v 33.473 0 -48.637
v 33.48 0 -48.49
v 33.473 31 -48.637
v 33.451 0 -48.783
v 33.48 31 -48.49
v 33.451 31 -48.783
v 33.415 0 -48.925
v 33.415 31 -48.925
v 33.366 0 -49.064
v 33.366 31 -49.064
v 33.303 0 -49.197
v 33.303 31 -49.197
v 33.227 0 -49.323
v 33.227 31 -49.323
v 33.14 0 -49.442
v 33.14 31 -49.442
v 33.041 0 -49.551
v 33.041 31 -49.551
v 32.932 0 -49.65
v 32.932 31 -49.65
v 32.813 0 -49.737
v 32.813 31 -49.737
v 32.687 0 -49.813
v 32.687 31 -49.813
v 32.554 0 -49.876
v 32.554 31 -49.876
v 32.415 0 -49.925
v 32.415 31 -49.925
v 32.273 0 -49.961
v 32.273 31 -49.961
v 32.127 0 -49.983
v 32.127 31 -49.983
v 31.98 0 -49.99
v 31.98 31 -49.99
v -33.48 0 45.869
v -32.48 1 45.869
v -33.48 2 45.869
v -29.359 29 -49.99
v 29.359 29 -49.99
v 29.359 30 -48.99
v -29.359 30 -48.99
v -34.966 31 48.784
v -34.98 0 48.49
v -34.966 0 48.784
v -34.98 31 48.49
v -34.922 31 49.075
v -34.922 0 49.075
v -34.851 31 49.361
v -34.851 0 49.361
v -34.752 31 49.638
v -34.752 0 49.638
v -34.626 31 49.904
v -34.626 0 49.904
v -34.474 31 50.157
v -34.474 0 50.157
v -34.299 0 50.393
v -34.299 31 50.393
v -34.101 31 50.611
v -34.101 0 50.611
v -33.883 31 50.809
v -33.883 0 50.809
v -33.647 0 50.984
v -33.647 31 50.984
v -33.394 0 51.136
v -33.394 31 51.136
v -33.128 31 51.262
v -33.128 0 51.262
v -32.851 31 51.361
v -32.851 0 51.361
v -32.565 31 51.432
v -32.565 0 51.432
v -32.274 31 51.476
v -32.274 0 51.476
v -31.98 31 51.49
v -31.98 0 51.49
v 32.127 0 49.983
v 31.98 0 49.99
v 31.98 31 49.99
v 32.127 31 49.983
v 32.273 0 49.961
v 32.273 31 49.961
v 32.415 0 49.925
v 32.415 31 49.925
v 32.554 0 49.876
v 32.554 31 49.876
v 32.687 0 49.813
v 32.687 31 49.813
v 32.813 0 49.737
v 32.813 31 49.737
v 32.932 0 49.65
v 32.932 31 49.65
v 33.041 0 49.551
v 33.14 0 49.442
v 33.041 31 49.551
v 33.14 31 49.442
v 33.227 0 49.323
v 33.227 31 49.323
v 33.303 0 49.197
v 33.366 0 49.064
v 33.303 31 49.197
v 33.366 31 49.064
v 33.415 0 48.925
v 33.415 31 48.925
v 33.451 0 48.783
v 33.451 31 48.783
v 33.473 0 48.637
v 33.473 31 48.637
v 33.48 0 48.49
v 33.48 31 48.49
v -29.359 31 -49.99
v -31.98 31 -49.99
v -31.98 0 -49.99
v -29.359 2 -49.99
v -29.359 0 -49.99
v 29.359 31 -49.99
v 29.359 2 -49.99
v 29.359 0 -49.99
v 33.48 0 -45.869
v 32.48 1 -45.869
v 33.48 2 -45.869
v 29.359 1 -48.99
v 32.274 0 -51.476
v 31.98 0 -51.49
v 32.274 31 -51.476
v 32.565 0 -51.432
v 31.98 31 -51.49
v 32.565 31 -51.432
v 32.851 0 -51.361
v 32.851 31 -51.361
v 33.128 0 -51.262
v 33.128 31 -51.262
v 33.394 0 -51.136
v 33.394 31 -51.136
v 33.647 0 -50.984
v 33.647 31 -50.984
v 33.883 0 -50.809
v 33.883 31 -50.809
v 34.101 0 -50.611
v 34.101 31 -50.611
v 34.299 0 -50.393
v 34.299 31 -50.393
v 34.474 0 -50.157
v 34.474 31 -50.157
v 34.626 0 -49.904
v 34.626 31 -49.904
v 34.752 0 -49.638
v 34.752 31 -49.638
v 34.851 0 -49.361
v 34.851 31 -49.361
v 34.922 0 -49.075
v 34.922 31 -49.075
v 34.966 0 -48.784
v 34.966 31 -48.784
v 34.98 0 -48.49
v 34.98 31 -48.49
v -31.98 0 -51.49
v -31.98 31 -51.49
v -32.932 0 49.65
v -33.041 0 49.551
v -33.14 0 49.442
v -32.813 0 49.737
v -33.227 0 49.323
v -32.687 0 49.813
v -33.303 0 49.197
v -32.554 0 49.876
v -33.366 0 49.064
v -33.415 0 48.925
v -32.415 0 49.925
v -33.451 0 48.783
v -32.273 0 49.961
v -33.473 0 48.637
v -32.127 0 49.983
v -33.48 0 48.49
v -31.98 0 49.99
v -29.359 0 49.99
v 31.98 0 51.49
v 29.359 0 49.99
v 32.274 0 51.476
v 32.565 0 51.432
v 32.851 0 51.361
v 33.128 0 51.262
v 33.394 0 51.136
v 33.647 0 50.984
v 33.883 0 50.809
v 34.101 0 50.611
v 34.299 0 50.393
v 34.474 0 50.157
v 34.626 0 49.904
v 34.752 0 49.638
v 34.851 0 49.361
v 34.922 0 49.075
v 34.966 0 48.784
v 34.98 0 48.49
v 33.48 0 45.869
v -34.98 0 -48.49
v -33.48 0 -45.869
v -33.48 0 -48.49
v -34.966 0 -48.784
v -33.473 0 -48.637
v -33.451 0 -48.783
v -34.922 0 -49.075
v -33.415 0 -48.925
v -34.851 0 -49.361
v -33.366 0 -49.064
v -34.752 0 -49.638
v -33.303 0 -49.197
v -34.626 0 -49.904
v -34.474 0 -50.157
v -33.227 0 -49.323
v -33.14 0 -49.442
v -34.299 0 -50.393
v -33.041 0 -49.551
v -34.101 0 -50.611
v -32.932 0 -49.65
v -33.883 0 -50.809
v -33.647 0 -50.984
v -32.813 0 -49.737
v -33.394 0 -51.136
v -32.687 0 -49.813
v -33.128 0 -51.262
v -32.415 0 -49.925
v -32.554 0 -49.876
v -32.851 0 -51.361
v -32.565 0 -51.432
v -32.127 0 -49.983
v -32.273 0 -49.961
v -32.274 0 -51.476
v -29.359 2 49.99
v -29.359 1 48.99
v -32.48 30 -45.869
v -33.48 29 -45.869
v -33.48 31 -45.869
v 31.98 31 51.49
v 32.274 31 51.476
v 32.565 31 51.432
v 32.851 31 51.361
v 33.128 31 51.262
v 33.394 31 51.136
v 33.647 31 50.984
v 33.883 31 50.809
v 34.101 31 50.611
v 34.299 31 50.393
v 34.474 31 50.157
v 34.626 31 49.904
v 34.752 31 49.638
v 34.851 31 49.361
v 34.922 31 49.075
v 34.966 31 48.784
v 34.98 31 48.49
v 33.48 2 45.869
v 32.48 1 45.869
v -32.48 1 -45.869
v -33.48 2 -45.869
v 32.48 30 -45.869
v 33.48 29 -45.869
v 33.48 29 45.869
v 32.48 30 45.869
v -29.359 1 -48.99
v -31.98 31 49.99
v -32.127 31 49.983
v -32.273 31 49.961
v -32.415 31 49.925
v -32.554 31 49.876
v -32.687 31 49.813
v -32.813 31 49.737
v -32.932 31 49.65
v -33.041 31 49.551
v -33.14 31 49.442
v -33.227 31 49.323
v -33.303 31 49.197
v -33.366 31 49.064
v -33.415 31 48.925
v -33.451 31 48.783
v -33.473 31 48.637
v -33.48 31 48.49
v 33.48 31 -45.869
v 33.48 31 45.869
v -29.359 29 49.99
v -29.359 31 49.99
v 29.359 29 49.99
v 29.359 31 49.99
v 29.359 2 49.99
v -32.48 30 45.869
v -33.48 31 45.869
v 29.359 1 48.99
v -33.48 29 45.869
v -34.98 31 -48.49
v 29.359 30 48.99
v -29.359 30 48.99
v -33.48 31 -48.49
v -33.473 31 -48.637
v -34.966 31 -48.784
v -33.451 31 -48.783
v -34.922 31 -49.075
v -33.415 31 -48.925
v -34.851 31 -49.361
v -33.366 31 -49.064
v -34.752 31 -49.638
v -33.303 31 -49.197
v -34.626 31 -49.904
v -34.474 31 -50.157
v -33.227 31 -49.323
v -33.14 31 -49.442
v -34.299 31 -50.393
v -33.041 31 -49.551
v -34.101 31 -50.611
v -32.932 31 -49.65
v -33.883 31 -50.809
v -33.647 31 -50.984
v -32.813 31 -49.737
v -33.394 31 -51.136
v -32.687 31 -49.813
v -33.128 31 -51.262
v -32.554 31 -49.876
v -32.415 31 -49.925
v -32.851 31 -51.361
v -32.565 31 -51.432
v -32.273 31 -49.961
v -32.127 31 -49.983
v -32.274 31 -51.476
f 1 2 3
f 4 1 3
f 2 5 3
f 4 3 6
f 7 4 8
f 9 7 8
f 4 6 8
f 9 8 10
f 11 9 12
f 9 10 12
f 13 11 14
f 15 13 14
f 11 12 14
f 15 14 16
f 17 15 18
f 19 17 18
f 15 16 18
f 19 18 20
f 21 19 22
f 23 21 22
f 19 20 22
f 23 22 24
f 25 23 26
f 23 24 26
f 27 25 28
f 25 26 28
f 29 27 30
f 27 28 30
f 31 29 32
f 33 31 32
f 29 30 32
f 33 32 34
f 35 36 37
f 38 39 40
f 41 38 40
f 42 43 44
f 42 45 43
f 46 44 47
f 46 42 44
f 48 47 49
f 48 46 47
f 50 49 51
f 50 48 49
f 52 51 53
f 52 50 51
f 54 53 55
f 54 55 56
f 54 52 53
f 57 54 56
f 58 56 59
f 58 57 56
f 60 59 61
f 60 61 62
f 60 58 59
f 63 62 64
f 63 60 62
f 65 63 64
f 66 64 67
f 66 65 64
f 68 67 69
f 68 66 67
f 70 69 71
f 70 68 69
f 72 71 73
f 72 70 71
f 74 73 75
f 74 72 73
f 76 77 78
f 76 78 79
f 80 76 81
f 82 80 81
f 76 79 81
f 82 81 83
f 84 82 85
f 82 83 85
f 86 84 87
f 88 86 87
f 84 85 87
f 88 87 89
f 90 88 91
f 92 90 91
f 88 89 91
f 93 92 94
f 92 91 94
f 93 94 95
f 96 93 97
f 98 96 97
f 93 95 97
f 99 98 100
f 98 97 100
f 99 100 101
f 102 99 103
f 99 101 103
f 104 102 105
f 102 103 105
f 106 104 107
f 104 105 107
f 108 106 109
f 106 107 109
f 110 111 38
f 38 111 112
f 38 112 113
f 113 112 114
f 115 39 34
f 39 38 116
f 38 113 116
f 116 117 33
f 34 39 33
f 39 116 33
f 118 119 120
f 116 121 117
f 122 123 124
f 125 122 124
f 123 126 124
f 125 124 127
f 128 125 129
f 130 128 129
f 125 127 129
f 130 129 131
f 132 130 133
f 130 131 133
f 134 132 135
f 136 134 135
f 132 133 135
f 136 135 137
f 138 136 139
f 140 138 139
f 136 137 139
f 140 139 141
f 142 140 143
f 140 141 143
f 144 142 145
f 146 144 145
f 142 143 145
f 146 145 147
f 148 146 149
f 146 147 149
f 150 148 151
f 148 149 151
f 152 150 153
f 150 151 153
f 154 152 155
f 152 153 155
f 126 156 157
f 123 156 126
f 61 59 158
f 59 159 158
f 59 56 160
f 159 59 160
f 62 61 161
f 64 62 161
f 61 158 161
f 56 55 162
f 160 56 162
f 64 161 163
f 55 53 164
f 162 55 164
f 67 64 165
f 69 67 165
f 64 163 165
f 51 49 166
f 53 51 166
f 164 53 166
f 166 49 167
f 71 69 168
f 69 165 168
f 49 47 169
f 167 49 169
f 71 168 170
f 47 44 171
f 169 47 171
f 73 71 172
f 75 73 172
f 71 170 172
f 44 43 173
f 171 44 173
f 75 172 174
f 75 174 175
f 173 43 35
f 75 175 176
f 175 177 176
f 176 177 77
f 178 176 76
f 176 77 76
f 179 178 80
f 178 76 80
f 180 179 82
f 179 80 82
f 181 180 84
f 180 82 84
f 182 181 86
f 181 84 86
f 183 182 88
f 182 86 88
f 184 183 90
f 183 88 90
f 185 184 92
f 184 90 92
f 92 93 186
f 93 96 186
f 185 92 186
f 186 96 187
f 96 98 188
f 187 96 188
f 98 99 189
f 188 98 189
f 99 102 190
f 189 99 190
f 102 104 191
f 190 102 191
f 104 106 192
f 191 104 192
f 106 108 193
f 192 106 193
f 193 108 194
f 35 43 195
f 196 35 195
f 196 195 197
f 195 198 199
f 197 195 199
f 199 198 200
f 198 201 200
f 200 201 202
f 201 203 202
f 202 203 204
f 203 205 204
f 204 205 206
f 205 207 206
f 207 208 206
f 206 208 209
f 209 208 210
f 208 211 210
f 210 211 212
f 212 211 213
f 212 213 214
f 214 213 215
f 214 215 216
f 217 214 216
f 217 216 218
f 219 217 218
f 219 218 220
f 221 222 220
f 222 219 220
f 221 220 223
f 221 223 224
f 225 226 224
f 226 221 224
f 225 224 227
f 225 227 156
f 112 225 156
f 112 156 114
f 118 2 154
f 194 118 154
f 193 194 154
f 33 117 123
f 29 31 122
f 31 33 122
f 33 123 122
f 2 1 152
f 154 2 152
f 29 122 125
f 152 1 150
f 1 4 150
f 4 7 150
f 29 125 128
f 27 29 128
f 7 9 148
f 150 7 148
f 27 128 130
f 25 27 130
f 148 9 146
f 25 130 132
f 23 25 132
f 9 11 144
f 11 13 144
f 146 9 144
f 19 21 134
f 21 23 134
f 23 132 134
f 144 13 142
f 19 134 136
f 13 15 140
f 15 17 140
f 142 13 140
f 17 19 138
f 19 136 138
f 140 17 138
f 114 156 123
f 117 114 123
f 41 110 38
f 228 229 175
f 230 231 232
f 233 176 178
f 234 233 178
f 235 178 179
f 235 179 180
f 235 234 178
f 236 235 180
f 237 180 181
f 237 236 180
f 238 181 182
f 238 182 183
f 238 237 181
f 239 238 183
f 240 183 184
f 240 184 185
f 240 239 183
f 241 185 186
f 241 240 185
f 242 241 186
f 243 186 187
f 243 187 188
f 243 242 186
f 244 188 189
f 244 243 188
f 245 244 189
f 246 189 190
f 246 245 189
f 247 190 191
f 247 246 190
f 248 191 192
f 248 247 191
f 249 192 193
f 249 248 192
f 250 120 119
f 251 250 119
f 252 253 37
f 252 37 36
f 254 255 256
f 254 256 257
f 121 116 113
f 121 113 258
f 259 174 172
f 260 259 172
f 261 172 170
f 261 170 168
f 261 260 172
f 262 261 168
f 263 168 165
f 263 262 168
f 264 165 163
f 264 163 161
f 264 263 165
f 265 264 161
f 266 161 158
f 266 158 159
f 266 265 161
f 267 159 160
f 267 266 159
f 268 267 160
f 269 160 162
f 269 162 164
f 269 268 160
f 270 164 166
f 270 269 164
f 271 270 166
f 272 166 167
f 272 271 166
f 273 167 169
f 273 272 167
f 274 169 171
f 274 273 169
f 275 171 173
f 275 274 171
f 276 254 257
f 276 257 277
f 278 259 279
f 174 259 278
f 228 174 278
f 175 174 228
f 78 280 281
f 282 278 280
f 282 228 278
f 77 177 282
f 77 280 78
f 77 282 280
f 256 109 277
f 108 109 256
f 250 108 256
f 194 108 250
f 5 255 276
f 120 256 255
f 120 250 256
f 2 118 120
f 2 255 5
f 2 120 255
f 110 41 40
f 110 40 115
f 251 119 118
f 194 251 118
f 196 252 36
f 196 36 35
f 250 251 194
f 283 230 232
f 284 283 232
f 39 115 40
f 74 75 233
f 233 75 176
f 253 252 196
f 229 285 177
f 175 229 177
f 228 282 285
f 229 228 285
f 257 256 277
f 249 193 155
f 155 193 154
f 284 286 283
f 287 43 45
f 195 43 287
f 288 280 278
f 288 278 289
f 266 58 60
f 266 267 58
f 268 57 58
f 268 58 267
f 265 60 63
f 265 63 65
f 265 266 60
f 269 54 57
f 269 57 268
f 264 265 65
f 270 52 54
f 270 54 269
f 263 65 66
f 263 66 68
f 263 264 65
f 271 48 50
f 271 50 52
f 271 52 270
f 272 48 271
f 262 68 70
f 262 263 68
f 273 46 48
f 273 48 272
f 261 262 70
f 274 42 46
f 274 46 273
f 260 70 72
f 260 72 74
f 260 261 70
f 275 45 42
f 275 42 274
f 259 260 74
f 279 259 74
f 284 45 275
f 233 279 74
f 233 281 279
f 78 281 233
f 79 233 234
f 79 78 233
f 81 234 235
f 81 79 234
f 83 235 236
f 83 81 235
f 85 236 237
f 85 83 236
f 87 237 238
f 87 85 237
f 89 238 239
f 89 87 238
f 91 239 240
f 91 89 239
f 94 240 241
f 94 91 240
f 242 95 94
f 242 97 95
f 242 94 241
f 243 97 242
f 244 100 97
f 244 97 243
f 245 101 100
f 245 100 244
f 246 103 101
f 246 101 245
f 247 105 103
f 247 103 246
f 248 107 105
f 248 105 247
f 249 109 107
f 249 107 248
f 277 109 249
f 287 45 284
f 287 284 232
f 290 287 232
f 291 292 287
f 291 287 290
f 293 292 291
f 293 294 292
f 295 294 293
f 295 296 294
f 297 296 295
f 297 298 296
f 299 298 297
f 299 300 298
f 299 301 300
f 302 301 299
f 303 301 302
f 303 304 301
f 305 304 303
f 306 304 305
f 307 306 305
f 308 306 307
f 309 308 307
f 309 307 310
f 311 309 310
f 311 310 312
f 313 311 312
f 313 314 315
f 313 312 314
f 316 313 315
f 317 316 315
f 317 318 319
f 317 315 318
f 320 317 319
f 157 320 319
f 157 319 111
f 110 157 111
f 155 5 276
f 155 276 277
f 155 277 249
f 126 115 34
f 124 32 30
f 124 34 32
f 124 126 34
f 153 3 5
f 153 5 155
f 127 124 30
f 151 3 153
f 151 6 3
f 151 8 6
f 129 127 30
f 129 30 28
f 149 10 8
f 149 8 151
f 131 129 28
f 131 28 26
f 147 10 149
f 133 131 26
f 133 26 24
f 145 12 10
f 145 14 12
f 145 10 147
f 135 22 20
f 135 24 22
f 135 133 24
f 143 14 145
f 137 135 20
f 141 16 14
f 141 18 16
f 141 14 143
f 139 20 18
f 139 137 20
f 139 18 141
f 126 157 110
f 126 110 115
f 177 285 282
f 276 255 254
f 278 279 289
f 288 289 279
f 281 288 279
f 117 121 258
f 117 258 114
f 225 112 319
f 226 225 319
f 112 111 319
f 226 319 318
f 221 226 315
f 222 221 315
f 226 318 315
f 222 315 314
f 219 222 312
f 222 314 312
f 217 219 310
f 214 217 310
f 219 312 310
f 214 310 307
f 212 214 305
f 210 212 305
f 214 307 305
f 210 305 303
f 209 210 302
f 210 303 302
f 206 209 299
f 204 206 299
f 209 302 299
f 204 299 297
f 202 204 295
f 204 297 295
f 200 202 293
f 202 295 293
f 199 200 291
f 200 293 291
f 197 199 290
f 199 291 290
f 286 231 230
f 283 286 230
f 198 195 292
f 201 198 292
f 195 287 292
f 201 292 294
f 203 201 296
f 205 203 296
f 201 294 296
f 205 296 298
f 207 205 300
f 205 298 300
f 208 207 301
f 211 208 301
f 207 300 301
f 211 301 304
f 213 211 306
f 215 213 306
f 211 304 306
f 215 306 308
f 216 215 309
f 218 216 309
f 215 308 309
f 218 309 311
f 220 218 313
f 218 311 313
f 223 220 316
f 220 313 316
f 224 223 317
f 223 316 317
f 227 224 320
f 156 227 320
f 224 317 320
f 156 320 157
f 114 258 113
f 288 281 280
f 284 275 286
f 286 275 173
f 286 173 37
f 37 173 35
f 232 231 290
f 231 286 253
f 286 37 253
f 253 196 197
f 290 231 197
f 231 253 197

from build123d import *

# Parameters (mm, degrees)
SKETCH1_W           = 69.96
SKETCH1_H           = 102.98
SKETCH1_W_2         = 66.96
SKETCH1_H_2         = 99.98
BOSS_EXTRUDE1_DEPTH = 31.0002
FILLET1_R           = 3
FILLET2_R           = 1.5
BOSS_EXTRUDE2_START = -29.3587
BOSS_EXTRUDE2_DEPTH = 58.7174
BOSS_EXTRUDE3_START = -45.8687
BOSS_EXTRUDE3_DEPTH = 91.7374


with BuildPart() as part:
    # Sketch1 → Boss-Extrude1 (new body)
    with BuildSketch(Plane(origin=(0, 0, 0), x_dir=(1, 0, 0), z_dir=(0, 1, 0))):
        Rectangle(SKETCH1_W, SKETCH1_H)
        Rectangle(SKETCH1_W_2, SKETCH1_H_2, mode=Mode.SUBTRACT)
    extrude(amount=BOSS_EXTRUDE1_DEPTH)

    # Fillet1
    fillet1_edges = [part.edges().sort_by_distance(p)[0] for p in [
        (34.98, 15.5001, 51.49),
        (-34.98, 15.5001, 51.49),
        (-34.98, 15.5001, -51.49),
        (34.98, 15.5001, -51.49),
    ]]
    fillet(fillet1_edges, radius=FILLET1_R)

    # Fillet2
    fillet2_edges = [part.edges().sort_by_distance(p)[0] for p in [
        (-33.48, 15.5001, -49.99),
        (-33.48, 15.5001, 49.99),
        (33.48, 15.5001, 49.99),
        (33.48, 15.5001, -49.99),
    ]]
    fillet(fillet2_edges, radius=FILLET2_R)

    # Sketch2 → Boss-Extrude2 (add)
    with BuildSketch(Plane(origin=(0, 0, 0), x_dir=(0, 0, -1), z_dir=(1, 0, 0)).offset(BOSS_EXTRUDE2_START)):
        Polygon((-49.99, 31.0002), (-49.99, 29.0001972), (-48.9899986, 30.0001986), align=None)
        Polygon((49.99, 31.0002), (49.99, 29.0001972), (48.9899986, 30.0001986), align=None)
        Polygon((-49.99, 0), (-49.99, 2), (-48.99, 1), align=None)
        Polygon((49.99, 0), (49.99, 2), (48.99, 1), align=None)
    extrude(amount=BOSS_EXTRUDE2_DEPTH)

    # Sketch3 → Boss-Extrude3 (add)
    with BuildSketch(Plane.XY.offset(BOSS_EXTRUDE3_START)):
        Polygon((-33.48, 31.0002), (-33.48, 29.0001972), (-32.4799986, 30.0001986), align=None)
        Polygon((-33.48, 0), (-33.48, 2), (-32.48, 1), align=None)
        Polygon((33.48, 31.0002), (33.48, 29.0001972), (32.4799986, 30.0001986), align=None)
        Polygon((33.48, 0), (33.48, 2), (32.48, 1), align=None)
    extrude(amount=BOSS_EXTRUDE3_DEPTH)


solid = part.part
